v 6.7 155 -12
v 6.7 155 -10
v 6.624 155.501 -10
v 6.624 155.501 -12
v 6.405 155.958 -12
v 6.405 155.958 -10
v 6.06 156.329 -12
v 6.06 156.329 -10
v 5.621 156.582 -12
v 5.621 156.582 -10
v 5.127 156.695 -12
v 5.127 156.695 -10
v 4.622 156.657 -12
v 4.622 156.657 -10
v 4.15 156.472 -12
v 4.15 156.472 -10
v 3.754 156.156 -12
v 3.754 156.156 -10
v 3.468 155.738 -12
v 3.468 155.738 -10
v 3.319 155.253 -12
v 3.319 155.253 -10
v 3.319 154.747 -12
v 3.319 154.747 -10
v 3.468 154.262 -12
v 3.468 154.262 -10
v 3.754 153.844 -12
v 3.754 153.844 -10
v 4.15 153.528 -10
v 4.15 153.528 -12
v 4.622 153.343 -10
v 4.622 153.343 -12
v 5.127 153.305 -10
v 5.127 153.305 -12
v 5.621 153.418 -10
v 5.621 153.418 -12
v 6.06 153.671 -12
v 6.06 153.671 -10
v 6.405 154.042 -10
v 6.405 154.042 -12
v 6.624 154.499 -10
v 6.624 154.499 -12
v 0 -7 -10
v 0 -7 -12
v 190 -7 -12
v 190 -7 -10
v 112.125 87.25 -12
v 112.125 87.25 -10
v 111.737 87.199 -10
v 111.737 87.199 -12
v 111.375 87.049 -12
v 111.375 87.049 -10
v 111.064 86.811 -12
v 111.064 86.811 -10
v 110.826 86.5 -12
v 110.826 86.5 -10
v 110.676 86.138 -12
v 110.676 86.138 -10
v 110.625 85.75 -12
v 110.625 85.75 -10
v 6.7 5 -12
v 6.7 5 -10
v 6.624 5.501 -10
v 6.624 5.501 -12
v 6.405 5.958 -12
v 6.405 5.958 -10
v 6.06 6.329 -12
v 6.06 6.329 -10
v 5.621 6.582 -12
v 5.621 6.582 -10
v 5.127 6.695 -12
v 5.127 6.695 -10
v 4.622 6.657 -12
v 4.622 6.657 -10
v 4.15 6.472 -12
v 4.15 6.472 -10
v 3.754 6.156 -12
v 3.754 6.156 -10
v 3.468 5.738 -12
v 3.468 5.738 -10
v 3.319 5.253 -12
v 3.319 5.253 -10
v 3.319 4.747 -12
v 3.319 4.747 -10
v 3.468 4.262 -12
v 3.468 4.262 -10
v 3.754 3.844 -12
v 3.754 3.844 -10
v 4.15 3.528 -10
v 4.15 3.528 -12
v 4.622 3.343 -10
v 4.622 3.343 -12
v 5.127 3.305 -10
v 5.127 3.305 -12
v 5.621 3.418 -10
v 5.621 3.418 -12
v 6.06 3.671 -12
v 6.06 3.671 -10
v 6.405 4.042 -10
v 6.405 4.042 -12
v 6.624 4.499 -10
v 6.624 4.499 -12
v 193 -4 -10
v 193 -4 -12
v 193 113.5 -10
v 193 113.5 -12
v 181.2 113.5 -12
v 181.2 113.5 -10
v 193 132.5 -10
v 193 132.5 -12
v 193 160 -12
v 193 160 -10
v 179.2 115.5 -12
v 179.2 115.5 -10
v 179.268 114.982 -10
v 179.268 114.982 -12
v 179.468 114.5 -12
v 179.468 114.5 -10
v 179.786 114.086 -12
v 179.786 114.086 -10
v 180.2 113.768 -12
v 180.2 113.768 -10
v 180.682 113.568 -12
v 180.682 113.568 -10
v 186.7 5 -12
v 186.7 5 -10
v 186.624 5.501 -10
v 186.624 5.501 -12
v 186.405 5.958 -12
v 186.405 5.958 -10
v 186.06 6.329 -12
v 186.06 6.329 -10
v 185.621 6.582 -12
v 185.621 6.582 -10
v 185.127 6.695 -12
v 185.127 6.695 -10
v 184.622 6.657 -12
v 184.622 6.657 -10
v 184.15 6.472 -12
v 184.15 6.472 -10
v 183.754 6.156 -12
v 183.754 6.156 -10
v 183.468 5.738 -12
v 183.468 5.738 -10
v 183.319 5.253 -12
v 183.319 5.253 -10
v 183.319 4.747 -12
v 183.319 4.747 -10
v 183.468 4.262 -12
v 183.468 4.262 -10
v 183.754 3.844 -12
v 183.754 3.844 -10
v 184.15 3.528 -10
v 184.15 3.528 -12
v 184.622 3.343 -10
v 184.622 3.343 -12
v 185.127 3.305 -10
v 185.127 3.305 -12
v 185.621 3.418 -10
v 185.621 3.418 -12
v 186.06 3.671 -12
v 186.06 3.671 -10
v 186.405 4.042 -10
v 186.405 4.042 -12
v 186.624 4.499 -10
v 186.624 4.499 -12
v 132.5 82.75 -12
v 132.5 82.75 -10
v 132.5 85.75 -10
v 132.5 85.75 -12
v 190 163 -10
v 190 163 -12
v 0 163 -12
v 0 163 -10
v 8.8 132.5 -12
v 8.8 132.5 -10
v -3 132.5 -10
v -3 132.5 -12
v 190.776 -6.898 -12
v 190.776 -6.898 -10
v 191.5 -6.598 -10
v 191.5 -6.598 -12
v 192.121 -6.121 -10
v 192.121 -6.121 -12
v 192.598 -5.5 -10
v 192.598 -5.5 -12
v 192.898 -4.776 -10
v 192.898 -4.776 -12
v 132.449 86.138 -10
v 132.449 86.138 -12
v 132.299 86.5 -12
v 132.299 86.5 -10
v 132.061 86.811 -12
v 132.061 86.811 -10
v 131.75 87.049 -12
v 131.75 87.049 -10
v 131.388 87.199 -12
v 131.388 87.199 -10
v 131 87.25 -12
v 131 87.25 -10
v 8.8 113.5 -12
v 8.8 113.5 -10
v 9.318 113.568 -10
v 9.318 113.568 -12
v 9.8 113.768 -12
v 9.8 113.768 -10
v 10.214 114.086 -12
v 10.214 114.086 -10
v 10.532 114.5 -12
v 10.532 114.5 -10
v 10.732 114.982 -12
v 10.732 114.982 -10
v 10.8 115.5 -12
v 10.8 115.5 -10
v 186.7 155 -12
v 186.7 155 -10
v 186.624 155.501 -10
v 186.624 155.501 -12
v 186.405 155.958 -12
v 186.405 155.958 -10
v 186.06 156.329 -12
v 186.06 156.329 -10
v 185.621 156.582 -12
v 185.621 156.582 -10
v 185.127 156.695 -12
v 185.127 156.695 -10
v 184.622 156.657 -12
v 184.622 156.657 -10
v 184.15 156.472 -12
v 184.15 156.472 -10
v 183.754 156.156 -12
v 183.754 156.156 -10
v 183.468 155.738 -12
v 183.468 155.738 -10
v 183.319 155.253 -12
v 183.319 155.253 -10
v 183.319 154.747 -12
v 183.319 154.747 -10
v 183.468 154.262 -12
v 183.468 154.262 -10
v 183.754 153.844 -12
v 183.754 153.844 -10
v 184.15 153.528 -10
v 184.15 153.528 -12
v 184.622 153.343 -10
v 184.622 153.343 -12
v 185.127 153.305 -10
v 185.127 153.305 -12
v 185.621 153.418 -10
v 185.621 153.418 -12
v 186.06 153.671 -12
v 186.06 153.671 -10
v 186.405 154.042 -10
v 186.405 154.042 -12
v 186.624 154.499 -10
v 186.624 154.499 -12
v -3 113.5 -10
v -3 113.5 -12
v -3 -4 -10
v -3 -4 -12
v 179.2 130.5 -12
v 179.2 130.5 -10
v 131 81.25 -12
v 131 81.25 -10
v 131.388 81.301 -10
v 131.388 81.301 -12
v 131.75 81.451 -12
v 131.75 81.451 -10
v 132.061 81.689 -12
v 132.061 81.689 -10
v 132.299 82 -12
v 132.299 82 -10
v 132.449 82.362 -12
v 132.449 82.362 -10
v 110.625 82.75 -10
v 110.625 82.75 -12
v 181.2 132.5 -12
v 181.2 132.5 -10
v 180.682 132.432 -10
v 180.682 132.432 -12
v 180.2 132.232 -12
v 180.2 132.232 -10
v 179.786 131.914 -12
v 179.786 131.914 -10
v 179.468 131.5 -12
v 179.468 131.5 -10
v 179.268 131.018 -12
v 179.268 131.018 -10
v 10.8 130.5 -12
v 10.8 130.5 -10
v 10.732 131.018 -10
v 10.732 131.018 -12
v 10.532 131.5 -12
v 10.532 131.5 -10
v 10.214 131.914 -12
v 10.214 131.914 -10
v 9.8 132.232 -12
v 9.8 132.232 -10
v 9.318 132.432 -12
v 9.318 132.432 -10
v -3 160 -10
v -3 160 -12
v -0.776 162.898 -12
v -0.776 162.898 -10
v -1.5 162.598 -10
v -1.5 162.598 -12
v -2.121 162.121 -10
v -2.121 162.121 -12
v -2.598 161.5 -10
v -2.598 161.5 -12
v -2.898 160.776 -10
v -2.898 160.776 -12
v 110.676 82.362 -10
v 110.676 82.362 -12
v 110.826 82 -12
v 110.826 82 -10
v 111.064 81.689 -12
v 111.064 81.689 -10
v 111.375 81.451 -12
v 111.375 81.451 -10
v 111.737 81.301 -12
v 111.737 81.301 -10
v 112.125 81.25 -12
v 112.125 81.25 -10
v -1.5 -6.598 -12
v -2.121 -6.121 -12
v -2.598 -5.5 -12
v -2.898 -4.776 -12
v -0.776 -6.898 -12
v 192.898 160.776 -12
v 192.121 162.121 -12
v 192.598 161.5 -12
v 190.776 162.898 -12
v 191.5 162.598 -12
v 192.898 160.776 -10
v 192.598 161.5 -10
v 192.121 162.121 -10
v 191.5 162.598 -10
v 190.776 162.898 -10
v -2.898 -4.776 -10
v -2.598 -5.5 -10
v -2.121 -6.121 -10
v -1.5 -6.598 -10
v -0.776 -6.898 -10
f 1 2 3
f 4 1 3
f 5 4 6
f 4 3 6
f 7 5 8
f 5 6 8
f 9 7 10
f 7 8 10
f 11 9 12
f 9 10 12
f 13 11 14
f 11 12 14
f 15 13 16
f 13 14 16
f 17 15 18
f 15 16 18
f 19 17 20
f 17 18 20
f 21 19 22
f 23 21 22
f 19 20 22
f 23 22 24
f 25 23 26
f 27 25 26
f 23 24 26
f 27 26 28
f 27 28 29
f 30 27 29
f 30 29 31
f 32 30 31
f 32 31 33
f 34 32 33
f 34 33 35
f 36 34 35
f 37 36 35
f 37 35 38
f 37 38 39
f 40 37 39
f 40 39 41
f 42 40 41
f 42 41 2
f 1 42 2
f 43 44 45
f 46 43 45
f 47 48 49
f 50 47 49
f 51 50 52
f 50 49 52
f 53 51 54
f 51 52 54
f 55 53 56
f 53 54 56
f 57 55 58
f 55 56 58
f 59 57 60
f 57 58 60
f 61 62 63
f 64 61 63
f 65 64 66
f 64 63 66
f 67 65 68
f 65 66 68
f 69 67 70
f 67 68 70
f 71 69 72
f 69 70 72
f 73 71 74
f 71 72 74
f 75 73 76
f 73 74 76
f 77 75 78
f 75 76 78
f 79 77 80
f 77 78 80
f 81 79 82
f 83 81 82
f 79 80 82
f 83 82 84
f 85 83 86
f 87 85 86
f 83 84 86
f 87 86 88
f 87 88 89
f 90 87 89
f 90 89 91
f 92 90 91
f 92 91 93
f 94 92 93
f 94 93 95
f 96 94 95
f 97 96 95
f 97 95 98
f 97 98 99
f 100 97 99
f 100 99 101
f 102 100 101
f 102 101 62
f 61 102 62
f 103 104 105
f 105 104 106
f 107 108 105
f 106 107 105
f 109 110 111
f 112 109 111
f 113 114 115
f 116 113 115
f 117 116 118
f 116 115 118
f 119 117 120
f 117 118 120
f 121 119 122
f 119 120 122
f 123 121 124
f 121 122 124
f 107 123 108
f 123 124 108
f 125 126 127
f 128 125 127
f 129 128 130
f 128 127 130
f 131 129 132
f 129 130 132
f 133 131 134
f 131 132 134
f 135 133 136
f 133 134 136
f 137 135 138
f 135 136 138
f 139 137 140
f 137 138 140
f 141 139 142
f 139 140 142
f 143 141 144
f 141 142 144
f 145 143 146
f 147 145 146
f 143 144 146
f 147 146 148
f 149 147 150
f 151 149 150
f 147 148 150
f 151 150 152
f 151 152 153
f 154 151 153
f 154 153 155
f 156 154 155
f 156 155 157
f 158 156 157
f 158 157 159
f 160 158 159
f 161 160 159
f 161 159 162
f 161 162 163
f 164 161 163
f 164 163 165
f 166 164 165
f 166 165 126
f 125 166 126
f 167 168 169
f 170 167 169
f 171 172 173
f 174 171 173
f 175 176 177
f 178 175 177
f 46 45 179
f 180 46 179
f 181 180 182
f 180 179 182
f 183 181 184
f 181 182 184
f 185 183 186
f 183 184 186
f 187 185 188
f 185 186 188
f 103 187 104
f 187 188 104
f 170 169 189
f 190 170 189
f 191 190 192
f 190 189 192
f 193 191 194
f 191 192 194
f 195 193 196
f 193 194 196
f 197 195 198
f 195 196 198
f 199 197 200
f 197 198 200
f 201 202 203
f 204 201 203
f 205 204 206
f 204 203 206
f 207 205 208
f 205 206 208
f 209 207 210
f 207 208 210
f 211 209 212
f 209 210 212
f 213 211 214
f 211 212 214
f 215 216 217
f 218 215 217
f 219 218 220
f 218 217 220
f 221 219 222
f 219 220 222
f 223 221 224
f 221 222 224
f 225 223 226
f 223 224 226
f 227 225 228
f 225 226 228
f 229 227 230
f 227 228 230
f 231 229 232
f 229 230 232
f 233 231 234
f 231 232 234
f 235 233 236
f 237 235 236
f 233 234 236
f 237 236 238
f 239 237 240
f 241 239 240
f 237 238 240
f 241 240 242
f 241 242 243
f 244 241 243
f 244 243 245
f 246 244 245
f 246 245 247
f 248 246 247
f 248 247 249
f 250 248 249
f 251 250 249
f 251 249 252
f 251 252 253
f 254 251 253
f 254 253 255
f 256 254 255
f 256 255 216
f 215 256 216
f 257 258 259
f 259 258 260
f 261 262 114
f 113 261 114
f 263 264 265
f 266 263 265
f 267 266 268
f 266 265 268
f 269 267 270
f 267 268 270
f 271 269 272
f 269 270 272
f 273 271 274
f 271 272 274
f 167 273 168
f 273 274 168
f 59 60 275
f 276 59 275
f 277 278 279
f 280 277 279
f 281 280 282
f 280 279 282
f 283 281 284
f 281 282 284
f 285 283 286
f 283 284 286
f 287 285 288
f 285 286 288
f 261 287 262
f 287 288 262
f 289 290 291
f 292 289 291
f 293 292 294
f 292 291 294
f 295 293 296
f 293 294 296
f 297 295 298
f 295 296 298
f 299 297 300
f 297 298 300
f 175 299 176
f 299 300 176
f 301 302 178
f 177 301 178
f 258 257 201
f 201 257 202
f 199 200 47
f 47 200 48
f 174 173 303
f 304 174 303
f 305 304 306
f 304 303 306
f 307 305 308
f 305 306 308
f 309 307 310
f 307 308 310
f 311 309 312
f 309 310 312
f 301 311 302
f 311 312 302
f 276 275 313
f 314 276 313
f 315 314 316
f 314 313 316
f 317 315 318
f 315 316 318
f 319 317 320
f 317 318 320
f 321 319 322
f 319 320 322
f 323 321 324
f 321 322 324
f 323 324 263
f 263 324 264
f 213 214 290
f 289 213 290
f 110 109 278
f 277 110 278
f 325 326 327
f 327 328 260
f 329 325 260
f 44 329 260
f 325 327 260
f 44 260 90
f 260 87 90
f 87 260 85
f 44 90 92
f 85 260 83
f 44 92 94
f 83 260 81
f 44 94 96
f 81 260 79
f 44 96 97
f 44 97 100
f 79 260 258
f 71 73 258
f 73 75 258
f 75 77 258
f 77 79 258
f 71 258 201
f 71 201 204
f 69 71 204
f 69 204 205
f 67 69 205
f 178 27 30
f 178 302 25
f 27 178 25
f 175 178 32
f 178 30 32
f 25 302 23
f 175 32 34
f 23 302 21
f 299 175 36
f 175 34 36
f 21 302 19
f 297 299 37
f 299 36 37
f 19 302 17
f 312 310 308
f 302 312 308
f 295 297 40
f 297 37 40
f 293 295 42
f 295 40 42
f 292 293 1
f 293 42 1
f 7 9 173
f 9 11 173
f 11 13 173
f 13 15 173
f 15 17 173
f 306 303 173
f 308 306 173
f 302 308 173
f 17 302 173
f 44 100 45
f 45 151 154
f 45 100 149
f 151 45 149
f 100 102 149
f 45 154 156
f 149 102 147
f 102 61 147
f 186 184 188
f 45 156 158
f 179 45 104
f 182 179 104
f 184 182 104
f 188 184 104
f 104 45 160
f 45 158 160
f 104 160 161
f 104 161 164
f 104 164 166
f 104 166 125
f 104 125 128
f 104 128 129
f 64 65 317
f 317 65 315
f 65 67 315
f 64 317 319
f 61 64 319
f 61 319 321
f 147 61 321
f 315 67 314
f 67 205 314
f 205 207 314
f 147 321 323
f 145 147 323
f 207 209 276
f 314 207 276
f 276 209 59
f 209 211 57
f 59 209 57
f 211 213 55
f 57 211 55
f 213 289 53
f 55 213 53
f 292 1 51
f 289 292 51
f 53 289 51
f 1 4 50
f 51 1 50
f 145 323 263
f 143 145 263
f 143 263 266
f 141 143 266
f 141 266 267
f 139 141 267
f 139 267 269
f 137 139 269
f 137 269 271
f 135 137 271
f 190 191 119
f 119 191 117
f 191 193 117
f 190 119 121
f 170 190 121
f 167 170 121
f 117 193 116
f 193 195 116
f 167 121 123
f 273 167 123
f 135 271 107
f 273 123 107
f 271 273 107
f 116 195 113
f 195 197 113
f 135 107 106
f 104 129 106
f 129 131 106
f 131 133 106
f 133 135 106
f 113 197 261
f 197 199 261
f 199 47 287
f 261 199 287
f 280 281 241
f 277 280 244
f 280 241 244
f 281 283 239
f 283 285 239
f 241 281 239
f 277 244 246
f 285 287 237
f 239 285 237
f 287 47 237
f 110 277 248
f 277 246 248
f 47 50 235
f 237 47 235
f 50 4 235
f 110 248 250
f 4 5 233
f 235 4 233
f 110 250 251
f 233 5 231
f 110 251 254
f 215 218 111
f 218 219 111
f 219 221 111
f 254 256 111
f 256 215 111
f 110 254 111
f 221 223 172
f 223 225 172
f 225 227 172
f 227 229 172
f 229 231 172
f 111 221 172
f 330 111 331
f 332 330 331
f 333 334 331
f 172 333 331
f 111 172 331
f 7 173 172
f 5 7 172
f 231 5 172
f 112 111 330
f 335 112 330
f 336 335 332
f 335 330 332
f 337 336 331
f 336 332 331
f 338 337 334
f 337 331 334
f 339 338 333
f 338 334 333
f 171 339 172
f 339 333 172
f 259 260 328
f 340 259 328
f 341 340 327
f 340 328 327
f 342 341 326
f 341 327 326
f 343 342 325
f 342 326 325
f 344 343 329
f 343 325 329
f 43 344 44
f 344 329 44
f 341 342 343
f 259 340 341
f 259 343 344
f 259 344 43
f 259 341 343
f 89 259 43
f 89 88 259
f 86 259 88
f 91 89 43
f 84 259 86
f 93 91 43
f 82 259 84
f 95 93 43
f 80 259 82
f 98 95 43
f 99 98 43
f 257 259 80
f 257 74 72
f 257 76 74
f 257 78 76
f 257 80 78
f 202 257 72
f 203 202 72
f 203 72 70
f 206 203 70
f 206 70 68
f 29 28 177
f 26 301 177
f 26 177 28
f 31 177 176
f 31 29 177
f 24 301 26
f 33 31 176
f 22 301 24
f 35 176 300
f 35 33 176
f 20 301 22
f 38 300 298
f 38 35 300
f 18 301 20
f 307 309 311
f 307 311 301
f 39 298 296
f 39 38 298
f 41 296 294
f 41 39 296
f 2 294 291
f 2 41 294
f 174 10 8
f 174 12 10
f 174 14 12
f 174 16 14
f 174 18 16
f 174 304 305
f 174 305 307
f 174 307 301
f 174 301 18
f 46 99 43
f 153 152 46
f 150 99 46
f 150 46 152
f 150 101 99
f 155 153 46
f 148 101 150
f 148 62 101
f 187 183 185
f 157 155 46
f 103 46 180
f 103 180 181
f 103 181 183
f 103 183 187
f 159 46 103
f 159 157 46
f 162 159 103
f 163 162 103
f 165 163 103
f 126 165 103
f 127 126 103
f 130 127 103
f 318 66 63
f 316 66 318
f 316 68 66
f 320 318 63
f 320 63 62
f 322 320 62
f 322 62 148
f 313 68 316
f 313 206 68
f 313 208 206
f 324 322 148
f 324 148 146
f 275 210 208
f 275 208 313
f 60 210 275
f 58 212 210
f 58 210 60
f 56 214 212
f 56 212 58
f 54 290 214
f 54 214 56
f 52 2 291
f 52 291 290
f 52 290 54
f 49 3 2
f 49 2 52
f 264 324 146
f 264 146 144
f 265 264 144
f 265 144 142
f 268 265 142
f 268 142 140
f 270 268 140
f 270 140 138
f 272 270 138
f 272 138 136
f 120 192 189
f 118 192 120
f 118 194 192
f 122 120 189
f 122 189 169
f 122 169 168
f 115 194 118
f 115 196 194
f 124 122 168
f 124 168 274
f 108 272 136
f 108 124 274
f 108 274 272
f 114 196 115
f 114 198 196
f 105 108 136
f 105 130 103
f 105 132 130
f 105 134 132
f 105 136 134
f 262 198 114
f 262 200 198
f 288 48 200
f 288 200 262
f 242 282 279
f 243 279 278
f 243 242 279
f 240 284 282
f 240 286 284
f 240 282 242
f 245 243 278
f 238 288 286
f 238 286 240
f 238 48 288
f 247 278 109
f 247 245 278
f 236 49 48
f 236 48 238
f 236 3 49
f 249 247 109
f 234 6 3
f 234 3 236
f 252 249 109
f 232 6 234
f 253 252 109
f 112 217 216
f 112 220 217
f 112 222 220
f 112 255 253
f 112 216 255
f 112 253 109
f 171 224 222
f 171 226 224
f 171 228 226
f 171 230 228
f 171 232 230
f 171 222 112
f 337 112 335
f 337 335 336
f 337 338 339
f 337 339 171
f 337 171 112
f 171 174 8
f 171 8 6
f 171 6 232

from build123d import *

# Parameters (mm, degrees)
ACRYLIC_2MM_START        = -12
ACRYLIC_2MM_DEPTH        = 2
HINGE_CLEARANCE_0_START  = -9.8
HINGE_CLEARANCE_0_DEPTH  = 2.4
HINGE_CLEARANCE_1_START  = -9.8
HINGE_CLEARANCE_1_DEPTH  = 2.4
M3_CLEARANCE_0_START     = -9.8
M3_CLEARANCE_0_PROFILE_R = 1.7
M3_CLEARANCE_0_DEPTH     = 2.4
M3_CLEARANCE_1_START     = -9.8
M3_CLEARANCE_1_PROFILE_R = 1.7
M3_CLEARANCE_1_DEPTH     = 2.4
M3_CLEARANCE_2_START     = -9.8
M3_CLEARANCE_2_PROFILE_R = 1.7
M3_CLEARANCE_2_DEPTH     = 2.4
M3_CLEARANCE_3_START     = -9.8
M3_CLEARANCE_3_PROFILE_R = 1.7
M3_CLEARANCE_3_DEPTH     = 2.4
KEYS_ACCESS_R1_5_START   = -9.8
KEYS_ACCESS_R1_5_DEPTH   = 2.4


with BuildPart() as part:
    # Acrylic_2mm_profile → Acrylic_2mm (new body)
    with BuildSketch(Plane.XY.offset(ACRYLIC_2MM_START)):
        with BuildLine():
            Line((0, -7), (190, -7))
            ThreePointArc((190, -7), (192.121320344, -6.121320344), (193, -4))
            Line((193, -4), (193, 160))
            ThreePointArc((193, 160), (192.121320344, 162.121320344), (190, 163))
            Line((190, 163), (0, 163))
            ThreePointArc((0, 163), (-2.121320344, 162.121320344), (-3, 160))
            Line((-3, 160), (-3, -4))
            ThreePointArc((-3, -4), (-2.121320344, -6.121320344), (0, -7))
        make_face()
    extrude(amount=ACRYLIC_2MM_DEPTH)

    # Hinge_clearance_0_profile → Hinge_clearance_0 (cut)
    with BuildSketch(Plane.XY.offset(HINGE_CLEARANCE_0_START)):
        with BuildLine():
            Line((-4, 113.5), (8.8, 113.5))
            ThreePointArc((8.8, 113.5), (10.214213562, 114.085786438), (10.8, 115.5))
            Line((10.8, 115.5), (10.8, 130.5))
            ThreePointArc((10.8, 130.5), (10.214213562, 131.914213562), (8.8, 132.5))
            Line((8.8, 132.5), (-4, 132.5))
            ThreePointArc((-4, 132.5), (-5.414213562, 131.914213562), (-6, 130.5))
            Line((-6, 130.5), (-6, 115.5))
            ThreePointArc((-6, 115.5), (-5.414213562, 114.085786438), (-4, 113.5))
        make_face()
    extrude(amount=-HINGE_CLEARANCE_0_DEPTH, mode=Mode.SUBTRACT)

    # Hinge_clearance_1_profile → Hinge_clearance_1 (cut)
    with BuildSketch(Plane.XY.offset(HINGE_CLEARANCE_1_START)):
        with BuildLine():
            Line((181.2, 113.5), (194, 113.5))
            ThreePointArc((194, 113.5), (195.414213562, 114.085786438), (196, 115.5))
            Line((196, 115.5), (196, 130.5))
            ThreePointArc((196, 130.5), (195.414213562, 131.914213562), (194, 132.5))
            Line((194, 132.5), (181.2, 132.5))
            ThreePointArc((181.2, 132.5), (179.785786438, 131.914213562), (179.2, 130.5))
            Line((179.2, 130.5), (179.2, 115.5))
            ThreePointArc((179.2, 115.5), (179.785786438, 114.085786438), (181.2, 113.5))
        make_face()
    extrude(amount=-HINGE_CLEARANCE_1_DEPTH, mode=Mode.SUBTRACT)

    # M3_clearance_0_profile → M3_clearance_0 (cut)
    with BuildSketch(Plane.XY.offset(M3_CLEARANCE_0_START)):
        with Locations((5, 5)):
            Circle(M3_CLEARANCE_0_PROFILE_R)
    extrude(amount=-M3_CLEARANCE_0_DEPTH, mode=Mode.SUBTRACT)

    # M3_clearance_1_profile → M3_clearance_1 (cut)
    with BuildSketch(Plane.XY.offset(M3_CLEARANCE_1_START)):
        with Locations((185, 5)):
            Circle(M3_CLEARANCE_1_PROFILE_R)
    extrude(amount=-M3_CLEARANCE_1_DEPTH, mode=Mode.SUBTRACT)

    # M3_clearance_2_profile → M3_clearance_2 (cut)
    with BuildSketch(Plane.XY.offset(M3_CLEARANCE_2_START)):
        with Locations((5, 155)):
            Circle(M3_CLEARANCE_2_PROFILE_R)
    extrude(amount=-M3_CLEARANCE_2_DEPTH, mode=Mode.SUBTRACT)

    # M3_clearance_3_profile → M3_clearance_3 (cut)
    with BuildSketch(Plane.XY.offset(M3_CLEARANCE_3_START)):
        with Locations((185, 155)):
            Circle(M3_CLEARANCE_3_PROFILE_R)
    extrude(amount=-M3_CLEARANCE_3_DEPTH, mode=Mode.SUBTRACT)

    # Keys_access_R1_5_profile → Keys_access_R1_5 (cut)
    with BuildSketch(Plane.XY.offset(KEYS_ACCESS_R1_5_START)):
        with BuildLine():
            Line((112.12500058, 81.24999704), (130.9999982, 81.24999704))
            ThreePointArc((130.9999982, 81.24999704), (132.060658372, 81.689336868), (132.4999982, 82.74999704))
            Line((132.4999982, 82.74999704), (132.4999982, 85.74999974))
            ThreePointArc((132.4999982, 85.74999974), (132.060658372, 86.810659912), (130.9999982, 87.24999974))
            Line((130.9999982, 87.24999974), (112.12500058, 87.24999974))
            ThreePointArc((112.12500058, 87.24999974), (111.064340408, 86.810659912), (110.62500058, 85.74999974))
            Line((110.62500058, 85.74999974), (110.62500058, 82.74999704))
            ThreePointArc((110.62500058, 82.74999704), (111.064340408, 81.689336868), (112.12500058, 81.24999704))
        make_face()
    extrude(amount=-KEYS_ACCESS_R1_5_DEPTH, mode=Mode.SUBTRACT)


solid = part.part
